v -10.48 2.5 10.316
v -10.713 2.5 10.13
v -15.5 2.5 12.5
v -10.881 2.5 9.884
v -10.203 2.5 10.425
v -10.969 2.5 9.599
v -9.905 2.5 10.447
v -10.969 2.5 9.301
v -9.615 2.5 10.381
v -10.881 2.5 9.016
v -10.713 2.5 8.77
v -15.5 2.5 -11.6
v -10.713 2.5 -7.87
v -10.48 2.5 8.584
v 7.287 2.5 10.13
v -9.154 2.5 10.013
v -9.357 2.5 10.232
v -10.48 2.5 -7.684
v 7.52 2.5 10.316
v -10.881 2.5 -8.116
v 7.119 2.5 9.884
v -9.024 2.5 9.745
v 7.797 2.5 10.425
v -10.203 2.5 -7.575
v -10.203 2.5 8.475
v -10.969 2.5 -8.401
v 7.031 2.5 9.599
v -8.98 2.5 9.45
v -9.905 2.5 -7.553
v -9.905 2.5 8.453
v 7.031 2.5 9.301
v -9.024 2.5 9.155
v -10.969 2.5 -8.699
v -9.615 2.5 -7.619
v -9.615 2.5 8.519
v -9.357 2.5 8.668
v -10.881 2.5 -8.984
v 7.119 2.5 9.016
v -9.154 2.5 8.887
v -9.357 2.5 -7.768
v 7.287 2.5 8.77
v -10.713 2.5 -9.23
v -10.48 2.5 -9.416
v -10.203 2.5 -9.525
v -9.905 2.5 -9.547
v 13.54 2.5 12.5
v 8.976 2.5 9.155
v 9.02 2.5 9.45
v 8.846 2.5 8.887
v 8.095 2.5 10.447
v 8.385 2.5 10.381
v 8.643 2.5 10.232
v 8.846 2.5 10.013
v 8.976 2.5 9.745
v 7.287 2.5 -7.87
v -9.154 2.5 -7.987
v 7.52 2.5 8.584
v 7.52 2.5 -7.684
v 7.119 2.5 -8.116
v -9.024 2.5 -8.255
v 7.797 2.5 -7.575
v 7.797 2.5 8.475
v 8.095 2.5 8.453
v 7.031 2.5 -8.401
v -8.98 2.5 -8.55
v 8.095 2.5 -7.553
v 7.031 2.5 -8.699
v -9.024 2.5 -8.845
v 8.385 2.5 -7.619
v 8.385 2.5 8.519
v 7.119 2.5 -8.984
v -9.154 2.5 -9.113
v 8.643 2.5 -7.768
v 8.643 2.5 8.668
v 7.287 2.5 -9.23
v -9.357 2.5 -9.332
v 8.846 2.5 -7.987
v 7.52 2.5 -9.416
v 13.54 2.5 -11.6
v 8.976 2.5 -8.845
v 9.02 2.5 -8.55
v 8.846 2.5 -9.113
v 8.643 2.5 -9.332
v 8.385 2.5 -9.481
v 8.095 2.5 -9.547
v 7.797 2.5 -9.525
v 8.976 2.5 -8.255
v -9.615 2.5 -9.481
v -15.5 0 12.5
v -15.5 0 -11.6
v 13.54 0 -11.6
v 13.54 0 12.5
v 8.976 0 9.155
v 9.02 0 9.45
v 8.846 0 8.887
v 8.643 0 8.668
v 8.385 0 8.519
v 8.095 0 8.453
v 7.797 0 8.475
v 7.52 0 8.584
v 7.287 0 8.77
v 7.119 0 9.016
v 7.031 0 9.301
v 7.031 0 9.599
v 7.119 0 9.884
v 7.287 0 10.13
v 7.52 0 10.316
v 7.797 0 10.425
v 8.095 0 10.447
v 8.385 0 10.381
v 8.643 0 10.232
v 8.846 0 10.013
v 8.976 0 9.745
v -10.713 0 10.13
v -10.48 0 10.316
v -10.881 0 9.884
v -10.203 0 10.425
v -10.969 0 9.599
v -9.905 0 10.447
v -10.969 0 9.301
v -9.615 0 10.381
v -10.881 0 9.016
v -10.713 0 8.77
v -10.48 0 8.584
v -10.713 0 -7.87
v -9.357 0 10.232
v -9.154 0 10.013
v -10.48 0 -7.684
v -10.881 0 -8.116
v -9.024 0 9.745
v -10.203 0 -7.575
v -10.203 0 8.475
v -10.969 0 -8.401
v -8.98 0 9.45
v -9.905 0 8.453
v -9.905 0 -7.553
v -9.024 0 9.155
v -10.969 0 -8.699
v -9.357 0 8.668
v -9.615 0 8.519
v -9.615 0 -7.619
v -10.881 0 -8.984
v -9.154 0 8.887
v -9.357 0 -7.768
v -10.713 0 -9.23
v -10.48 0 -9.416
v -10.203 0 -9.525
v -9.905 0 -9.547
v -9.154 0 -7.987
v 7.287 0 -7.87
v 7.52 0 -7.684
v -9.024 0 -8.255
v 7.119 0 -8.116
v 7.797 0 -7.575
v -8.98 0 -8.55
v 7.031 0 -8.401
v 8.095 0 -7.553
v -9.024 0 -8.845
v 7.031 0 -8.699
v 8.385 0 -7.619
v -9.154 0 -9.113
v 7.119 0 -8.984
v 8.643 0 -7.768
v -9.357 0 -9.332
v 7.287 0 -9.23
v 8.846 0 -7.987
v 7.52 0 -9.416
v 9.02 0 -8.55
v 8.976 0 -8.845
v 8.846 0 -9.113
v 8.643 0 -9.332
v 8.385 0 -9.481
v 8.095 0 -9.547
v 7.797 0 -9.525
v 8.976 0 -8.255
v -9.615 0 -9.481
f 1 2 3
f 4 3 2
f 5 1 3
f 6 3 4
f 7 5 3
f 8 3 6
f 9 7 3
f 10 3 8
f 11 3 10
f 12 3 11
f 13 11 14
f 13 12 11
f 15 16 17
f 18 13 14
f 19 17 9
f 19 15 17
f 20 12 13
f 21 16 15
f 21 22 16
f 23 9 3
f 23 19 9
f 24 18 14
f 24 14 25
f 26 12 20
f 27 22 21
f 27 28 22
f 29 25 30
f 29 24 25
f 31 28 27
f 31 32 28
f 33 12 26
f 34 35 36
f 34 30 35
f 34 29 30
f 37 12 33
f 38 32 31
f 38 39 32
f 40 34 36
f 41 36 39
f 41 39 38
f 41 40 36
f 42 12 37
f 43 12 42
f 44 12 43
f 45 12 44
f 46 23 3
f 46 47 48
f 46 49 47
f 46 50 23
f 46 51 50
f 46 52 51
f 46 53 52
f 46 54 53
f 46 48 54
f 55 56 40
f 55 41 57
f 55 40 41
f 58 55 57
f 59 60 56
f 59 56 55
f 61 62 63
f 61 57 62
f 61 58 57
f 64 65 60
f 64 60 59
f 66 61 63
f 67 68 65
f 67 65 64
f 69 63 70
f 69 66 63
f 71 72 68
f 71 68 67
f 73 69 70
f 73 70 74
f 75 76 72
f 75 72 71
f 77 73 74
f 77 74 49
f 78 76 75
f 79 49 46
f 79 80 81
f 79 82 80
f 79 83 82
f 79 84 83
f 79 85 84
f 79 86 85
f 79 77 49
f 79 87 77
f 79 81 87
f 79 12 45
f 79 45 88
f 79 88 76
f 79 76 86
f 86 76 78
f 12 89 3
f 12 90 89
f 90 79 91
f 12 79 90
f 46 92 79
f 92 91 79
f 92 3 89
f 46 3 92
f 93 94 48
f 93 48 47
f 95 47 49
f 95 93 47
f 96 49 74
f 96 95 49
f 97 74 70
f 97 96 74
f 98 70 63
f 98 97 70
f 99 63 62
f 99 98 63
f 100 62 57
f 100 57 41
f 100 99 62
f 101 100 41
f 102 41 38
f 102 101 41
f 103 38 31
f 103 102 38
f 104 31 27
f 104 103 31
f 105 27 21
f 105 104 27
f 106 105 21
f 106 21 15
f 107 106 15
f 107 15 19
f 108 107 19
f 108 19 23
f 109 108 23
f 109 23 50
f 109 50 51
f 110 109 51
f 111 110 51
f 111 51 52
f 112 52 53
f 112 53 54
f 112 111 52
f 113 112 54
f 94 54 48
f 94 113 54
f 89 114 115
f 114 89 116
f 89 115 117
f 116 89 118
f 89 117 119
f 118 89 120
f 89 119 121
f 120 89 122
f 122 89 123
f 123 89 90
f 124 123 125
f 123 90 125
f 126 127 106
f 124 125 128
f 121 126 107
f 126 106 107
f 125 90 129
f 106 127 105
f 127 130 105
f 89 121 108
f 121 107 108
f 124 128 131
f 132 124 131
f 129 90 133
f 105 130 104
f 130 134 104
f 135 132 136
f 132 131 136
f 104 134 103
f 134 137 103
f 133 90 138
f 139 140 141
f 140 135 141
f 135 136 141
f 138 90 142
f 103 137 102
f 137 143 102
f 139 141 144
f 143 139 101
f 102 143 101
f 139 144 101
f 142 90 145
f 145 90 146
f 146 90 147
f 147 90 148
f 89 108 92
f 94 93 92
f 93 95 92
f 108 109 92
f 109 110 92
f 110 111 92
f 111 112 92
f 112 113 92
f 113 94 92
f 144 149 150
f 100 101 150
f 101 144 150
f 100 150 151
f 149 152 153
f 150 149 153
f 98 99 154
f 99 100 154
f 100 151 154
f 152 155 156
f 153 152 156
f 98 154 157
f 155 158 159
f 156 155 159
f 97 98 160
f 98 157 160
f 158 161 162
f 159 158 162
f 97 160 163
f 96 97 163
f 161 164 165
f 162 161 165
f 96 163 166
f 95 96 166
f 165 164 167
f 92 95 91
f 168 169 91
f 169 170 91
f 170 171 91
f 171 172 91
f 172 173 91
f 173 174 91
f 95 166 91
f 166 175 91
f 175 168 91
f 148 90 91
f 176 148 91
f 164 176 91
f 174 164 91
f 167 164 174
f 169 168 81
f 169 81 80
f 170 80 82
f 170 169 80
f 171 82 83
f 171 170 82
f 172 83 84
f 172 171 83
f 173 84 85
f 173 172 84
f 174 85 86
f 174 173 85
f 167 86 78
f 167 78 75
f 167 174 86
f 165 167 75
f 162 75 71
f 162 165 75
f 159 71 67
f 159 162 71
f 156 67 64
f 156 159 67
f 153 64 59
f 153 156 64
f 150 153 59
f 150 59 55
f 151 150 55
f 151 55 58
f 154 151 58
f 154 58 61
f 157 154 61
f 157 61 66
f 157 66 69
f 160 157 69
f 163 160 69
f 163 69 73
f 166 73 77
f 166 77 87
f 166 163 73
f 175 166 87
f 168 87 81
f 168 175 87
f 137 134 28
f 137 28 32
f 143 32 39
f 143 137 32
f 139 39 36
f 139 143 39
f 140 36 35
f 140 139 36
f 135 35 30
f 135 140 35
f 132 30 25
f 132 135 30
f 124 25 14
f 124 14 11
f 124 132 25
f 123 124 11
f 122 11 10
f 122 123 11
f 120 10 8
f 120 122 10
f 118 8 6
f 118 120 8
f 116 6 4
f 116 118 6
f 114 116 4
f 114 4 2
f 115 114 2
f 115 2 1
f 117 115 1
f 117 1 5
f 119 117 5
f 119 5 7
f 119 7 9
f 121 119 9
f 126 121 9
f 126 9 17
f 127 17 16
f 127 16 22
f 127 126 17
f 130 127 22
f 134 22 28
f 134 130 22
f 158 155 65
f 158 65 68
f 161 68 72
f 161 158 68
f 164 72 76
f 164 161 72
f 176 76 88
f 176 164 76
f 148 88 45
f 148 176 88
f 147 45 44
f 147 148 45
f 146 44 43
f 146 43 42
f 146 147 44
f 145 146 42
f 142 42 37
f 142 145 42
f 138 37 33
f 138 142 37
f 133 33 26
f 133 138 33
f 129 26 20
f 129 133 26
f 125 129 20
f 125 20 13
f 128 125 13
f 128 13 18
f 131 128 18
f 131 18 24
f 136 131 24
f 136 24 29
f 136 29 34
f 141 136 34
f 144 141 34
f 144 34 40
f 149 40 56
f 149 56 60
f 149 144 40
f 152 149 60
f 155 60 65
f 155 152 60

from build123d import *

# Parameters (mm, degrees)
SKETCH1_W           = 29.04
SKETCH1_H           = 23.1
SKETCH1_R           = 1
BOSS_EXTRUDE1_DEPTH = 2.5
SKETCH2_W           = 29.04
SKETCH2_H           = 2.5
BOSS_EXTRUDE2_DEPTH = 0.5
SKETCH3_W           = 29.04
SKETCH3_H           = 2.5
BOSS_EXTRUDE3_DEPTH = 0.5


with BuildPart() as part:
    # Sketch1 → Boss-Extrude1 (new body)
    with BuildSketch(Plane(origin=(0, 0, 0), x_dir=(1, 0, 0), z_dir=(0, 1, 0))):
        with Locations((-0.98, -0.45)):
            Rectangle(SKETCH1_W, SKETCH1_H)
        with Locations((-9.98, 8.55)):
            Circle(SKETCH1_R, mode=Mode.SUBTRACT)
        with Locations((8.02, 8.55)):
            Circle(SKETCH1_R, mode=Mode.SUBTRACT)
        with Locations((8.02, -9.45)):
            Circle(SKETCH1_R, mode=Mode.SUBTRACT)
        with Locations((-9.98, -9.45)):
            Circle(SKETCH1_R, mode=Mode.SUBTRACT)
    extrude(amount=BOSS_EXTRUDE1_DEPTH)

    # Sketch2 → Boss-Extrude2 (add)
    with BuildSketch(Plane(origin=(0, 0, -11.1), x_dir=(-1, 0, 0), z_dir=(0, 0, -1))):
        with Locations((0.98, 1.25)):
            Rectangle(SKETCH2_W, SKETCH2_H)
    extrude(amount=BOSS_EXTRUDE2_DEPTH)

    # Sketch3 → Boss-Extrude3 (add)
    with BuildSketch(Plane.XY.offset(12)):
        with Locations((-0.98, 1.25)):
            Rectangle(SKETCH3_W, SKETCH3_H)
    extrude(amount=BOSS_EXTRUDE3_DEPTH)


solid = part.part
